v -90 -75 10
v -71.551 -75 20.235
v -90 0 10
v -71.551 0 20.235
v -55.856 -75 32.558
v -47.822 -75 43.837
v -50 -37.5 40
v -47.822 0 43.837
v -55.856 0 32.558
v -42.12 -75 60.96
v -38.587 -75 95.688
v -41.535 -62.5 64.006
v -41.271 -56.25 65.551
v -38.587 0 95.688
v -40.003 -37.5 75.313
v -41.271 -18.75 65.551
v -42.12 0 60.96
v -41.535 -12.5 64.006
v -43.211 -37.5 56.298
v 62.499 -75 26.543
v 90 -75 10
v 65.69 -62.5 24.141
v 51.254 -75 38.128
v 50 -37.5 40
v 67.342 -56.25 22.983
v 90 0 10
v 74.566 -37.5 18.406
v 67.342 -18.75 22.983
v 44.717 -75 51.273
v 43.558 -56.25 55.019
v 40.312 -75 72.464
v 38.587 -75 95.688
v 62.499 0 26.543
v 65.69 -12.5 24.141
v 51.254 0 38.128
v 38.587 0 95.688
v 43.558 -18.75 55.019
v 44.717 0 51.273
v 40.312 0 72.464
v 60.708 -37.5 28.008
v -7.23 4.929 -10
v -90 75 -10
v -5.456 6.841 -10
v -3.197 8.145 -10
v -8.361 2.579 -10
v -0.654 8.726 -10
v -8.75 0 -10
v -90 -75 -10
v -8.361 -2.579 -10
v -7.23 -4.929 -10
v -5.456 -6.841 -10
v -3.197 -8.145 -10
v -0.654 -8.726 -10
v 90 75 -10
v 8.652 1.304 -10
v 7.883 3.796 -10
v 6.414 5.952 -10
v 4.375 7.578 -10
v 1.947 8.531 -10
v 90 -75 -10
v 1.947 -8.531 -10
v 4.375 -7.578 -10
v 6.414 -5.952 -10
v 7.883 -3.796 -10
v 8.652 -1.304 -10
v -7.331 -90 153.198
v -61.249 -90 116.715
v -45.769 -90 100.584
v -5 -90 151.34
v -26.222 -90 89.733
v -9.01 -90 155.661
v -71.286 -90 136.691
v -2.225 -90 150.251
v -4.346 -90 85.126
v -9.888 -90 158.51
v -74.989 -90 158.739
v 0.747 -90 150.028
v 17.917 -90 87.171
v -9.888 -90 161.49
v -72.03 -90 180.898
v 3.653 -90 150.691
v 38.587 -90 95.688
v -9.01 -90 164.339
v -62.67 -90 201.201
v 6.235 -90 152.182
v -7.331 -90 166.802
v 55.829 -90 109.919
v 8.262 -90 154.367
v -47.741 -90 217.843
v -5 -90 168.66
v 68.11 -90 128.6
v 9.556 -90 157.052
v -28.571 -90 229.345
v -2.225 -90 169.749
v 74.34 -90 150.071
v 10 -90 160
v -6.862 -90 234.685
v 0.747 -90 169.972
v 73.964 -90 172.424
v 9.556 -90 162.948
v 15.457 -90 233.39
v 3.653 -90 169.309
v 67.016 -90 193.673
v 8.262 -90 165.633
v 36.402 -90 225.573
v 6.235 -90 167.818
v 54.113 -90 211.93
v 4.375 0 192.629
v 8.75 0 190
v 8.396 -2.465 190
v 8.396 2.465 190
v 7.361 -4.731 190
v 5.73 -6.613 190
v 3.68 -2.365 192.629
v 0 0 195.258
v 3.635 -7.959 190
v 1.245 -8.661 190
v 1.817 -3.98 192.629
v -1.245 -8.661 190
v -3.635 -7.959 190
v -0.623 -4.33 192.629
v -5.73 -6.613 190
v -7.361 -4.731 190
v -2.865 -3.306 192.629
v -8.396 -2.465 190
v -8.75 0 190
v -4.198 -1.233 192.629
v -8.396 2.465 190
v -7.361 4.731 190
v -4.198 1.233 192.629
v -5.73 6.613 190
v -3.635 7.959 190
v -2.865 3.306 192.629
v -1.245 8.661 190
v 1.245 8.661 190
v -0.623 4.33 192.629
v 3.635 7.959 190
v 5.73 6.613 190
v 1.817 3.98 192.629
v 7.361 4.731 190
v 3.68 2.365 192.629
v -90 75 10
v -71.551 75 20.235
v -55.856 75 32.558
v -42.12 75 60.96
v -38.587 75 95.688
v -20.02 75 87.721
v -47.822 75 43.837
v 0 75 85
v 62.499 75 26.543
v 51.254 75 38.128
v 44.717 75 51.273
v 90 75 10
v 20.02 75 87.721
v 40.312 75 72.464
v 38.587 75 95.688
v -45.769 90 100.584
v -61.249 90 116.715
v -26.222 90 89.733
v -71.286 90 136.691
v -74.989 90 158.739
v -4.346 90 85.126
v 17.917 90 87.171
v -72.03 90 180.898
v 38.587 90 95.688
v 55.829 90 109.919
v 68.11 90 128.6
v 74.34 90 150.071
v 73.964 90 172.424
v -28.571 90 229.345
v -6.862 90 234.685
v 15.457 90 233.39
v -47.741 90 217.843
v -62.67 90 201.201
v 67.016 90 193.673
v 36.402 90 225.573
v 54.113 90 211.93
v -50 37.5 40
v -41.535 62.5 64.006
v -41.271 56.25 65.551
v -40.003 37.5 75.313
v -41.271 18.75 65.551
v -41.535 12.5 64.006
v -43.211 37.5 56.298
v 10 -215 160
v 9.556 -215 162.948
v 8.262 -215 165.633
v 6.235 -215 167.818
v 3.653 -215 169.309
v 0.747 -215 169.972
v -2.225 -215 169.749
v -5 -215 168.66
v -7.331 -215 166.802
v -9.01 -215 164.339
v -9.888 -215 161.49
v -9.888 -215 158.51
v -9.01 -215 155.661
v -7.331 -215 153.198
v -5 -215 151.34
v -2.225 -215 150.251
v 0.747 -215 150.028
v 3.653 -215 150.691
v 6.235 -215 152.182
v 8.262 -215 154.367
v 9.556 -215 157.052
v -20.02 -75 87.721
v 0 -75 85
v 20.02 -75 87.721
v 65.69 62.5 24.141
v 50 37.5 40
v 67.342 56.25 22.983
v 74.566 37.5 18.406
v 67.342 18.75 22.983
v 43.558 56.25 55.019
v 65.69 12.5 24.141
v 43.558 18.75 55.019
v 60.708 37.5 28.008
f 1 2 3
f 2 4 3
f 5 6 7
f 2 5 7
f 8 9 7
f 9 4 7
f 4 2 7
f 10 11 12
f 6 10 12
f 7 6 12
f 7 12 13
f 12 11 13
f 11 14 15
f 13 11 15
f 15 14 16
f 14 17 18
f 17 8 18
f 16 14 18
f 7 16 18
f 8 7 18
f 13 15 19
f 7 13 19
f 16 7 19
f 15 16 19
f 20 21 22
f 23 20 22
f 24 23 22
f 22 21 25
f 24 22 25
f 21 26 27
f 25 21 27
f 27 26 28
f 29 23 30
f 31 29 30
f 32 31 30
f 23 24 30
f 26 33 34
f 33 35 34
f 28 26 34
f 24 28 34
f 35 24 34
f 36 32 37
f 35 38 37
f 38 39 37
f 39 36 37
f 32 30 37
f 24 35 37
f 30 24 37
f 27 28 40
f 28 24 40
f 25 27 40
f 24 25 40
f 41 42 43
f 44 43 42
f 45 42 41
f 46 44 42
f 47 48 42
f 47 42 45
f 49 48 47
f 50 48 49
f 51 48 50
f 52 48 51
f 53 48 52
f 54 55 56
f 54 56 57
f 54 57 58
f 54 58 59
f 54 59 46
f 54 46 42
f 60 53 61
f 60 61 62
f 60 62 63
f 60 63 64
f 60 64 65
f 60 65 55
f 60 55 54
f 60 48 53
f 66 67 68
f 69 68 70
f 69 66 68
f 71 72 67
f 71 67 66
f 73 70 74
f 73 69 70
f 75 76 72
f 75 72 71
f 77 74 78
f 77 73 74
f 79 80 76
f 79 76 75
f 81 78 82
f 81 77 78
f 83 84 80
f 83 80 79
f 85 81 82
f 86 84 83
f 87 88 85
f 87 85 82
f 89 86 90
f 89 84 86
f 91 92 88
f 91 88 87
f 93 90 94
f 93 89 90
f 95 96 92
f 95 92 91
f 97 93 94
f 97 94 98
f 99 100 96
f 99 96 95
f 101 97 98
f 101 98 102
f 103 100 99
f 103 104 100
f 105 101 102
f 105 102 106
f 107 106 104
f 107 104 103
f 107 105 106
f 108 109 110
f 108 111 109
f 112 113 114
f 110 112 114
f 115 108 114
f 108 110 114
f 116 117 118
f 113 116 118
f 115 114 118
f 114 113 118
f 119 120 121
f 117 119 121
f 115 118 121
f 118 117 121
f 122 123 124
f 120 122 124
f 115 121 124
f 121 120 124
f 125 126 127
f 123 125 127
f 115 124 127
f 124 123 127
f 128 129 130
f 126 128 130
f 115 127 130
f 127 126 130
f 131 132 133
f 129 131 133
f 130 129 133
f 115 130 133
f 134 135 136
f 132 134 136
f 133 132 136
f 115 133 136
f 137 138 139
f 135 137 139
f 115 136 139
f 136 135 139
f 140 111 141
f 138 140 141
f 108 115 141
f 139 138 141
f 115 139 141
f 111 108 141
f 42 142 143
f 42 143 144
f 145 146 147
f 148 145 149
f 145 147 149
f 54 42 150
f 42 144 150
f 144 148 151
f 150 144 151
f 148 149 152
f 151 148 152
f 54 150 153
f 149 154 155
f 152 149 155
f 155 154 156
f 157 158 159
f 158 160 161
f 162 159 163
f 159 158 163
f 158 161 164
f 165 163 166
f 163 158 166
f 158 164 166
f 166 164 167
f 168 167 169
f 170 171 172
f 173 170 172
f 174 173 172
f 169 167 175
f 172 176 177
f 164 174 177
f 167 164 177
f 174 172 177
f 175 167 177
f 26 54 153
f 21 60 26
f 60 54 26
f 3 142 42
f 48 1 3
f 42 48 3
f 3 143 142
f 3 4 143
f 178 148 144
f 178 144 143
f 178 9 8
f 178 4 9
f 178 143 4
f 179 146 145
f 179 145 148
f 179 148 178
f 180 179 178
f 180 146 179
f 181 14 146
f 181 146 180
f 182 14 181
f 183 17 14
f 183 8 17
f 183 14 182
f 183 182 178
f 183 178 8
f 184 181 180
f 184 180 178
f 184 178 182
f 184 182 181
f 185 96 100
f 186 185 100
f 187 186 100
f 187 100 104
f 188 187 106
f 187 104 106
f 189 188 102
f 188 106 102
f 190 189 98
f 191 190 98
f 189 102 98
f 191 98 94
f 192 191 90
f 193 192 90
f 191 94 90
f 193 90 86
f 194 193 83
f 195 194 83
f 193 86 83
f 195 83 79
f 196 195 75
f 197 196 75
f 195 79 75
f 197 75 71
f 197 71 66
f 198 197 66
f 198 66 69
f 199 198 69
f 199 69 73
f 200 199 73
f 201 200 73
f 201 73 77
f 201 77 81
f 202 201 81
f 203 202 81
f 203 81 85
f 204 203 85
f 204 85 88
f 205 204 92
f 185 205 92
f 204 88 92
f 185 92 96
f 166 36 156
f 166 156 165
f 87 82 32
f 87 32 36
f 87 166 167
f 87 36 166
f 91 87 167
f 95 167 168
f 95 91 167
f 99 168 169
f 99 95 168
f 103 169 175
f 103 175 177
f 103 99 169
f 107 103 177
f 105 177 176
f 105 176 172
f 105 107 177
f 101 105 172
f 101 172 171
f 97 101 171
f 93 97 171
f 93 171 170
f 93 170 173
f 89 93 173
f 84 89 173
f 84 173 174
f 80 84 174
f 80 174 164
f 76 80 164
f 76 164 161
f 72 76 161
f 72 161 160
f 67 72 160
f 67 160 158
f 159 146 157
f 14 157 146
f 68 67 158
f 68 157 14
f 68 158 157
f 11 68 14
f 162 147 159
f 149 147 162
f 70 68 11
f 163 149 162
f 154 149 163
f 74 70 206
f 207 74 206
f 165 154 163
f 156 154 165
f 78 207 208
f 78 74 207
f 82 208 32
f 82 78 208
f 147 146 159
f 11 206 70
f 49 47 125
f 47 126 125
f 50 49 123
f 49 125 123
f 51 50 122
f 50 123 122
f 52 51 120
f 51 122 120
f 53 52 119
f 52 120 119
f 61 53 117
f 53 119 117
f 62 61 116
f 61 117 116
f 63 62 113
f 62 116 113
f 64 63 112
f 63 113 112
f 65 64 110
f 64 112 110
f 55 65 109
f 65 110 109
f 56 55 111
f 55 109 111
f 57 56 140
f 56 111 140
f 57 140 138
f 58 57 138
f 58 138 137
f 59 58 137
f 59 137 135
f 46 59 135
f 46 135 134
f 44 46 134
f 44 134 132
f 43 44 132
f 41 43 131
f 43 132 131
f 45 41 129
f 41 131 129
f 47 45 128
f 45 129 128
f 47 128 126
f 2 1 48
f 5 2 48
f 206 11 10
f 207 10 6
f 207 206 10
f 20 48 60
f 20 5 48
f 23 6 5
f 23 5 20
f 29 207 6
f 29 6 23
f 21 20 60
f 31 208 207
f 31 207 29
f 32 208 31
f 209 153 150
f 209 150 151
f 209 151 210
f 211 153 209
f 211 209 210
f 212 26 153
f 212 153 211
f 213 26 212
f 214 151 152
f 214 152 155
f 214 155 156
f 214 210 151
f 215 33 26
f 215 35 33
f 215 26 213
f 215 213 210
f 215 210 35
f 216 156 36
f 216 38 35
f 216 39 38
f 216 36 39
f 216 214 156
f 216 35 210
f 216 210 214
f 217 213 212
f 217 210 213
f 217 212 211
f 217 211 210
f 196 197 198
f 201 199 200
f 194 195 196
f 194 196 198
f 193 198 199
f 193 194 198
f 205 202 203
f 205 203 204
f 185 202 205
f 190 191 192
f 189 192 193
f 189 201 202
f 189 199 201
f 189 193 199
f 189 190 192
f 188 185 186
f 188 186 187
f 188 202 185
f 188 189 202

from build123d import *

# Parameters (mm, degrees)
F1_DEPTH = 90
F2_DEPTH = 75
F3_R     = 10
F4_DEPTH = 125
F6_D     = 17.5
F6_DEPTH = 200
F6_TIP   = 5.2575304165


with BuildPart() as f1:
    # F0 (on Front) → F1 (new body, symmetric)
    with BuildSketch(Plane.XZ):
        with BuildLine():
            ThreePointArc((-38.5871816571, 95.6880305716), (0, 85), (38.5871816571, 95.6880305716))
            ThreePointArc((38.5871816571, 95.6880305716), (65.2649930065, 123.0475888762), (75, 160))
            ThreePointArc((75, 160), (-36.9524111238, 225.2649930065), (-38.5871816571, 95.6880305716))
        make_face()
    extrude(amount=F1_DEPTH, both=True)

    # F0 (on Front) → F2 (join, symmetric)
    with BuildSketch(Plane.XZ):
        Polygon((-90, -10), (90, -10), (90, 10), (50, 10), (0, 10), (-50, 10), (-90, 10), align=None)
        with BuildLine():
            Line((50, 10), (90, 10))
            add(Edge.make_bspline(
                [(90, 10), (74.3035884973, 18.2071101409), (58.6071769946, 26.4142202817), (50, 40)],
                knots=[0, 0, 0, 0, 0.4839662752, 0.4839662752, 0.4839662752, 0.4839662752], degree=3))
            Line((50, 40), (50, 10))
        make_face()
        with BuildLine():
            add(Edge.make_bspline(
                [(-90, 10), (-74.3035884973, 18.2071101409), (-58.6071769946, 26.4142202817), (-50, 40)],
                knots=[0, 0, 0, 0, 0.4839662752, 0.4839662752, 0.4839662752, 0.4839662752], degree=3))
            Line((-90, 10), (-50, 10))
            Line((-50, 10), (-50, 40))
        make_face()
        with BuildLine():
            Line((0, 10), (50, 10))
            Line((50, 10), (50, 40))
            add(Edge.make_bspline(
                [(50, 40), (40.8225142283, 54.4859691093), (39.7048479427, 75.0869998404), (38.5871816571, 95.6880305716)],
                knots=[0.4839662752, 0.4839662752, 0.4839662752, 0.4839662752, 1, 1, 1, 1], degree=3))
            ThreePointArc((38.5871816571, 95.6880305716), (0, 85), (-38.5871816571, 95.6880305716))
            add(Edge.make_bspline(
                [(-50, 40), (-40.8225142283, 54.4859691093), (-39.7048479427, 75.0869998404), (-38.5871816571, 95.6880305716)],
                knots=[0.4839662752, 0.4839662752, 0.4839662752, 0.4839662752, 1, 1, 1, 1], degree=3))
            Line((-50, 40), (-50, 10))
            Line((-50, 10), (0, 10))
        make_face()
        with BuildLine():
            ThreePointArc((-38.5871816571, 95.6880305716), (0, 85), (38.5871816571, 95.6880305716))
            ThreePointArc((38.5871816571, 95.6880305716), (65.2649930065, 123.0475888762), (75, 160))
            ThreePointArc((75, 160), (-36.9524111238, 225.2649930065), (-38.5871816571, 95.6880305716))
        make_face()
    extrude(amount=F2_DEPTH, both=True)

    # F3 (on face) → F4 (join)
    with BuildSketch(Plane.XZ.offset(90)):
        with Locations((0, 160)):
            Circle(F3_R)
    extrude(amount=F4_DEPTH)

    # F6
    with Locations(Plane(origin=(0, 0, -10), x_dir=(1, 0, 0), z_dir=(0, 0, -1))):
        with Locations((0, 0)):
            Hole(F6_D / 2, depth=F6_DEPTH)
            with Locations((0, 0, -(F6_DEPTH + F6_TIP / 2))):  # 118° drill point
                Cone(0, F6_D / 2, F6_TIP, mode=Mode.SUBTRACT)


solid = f1.part
